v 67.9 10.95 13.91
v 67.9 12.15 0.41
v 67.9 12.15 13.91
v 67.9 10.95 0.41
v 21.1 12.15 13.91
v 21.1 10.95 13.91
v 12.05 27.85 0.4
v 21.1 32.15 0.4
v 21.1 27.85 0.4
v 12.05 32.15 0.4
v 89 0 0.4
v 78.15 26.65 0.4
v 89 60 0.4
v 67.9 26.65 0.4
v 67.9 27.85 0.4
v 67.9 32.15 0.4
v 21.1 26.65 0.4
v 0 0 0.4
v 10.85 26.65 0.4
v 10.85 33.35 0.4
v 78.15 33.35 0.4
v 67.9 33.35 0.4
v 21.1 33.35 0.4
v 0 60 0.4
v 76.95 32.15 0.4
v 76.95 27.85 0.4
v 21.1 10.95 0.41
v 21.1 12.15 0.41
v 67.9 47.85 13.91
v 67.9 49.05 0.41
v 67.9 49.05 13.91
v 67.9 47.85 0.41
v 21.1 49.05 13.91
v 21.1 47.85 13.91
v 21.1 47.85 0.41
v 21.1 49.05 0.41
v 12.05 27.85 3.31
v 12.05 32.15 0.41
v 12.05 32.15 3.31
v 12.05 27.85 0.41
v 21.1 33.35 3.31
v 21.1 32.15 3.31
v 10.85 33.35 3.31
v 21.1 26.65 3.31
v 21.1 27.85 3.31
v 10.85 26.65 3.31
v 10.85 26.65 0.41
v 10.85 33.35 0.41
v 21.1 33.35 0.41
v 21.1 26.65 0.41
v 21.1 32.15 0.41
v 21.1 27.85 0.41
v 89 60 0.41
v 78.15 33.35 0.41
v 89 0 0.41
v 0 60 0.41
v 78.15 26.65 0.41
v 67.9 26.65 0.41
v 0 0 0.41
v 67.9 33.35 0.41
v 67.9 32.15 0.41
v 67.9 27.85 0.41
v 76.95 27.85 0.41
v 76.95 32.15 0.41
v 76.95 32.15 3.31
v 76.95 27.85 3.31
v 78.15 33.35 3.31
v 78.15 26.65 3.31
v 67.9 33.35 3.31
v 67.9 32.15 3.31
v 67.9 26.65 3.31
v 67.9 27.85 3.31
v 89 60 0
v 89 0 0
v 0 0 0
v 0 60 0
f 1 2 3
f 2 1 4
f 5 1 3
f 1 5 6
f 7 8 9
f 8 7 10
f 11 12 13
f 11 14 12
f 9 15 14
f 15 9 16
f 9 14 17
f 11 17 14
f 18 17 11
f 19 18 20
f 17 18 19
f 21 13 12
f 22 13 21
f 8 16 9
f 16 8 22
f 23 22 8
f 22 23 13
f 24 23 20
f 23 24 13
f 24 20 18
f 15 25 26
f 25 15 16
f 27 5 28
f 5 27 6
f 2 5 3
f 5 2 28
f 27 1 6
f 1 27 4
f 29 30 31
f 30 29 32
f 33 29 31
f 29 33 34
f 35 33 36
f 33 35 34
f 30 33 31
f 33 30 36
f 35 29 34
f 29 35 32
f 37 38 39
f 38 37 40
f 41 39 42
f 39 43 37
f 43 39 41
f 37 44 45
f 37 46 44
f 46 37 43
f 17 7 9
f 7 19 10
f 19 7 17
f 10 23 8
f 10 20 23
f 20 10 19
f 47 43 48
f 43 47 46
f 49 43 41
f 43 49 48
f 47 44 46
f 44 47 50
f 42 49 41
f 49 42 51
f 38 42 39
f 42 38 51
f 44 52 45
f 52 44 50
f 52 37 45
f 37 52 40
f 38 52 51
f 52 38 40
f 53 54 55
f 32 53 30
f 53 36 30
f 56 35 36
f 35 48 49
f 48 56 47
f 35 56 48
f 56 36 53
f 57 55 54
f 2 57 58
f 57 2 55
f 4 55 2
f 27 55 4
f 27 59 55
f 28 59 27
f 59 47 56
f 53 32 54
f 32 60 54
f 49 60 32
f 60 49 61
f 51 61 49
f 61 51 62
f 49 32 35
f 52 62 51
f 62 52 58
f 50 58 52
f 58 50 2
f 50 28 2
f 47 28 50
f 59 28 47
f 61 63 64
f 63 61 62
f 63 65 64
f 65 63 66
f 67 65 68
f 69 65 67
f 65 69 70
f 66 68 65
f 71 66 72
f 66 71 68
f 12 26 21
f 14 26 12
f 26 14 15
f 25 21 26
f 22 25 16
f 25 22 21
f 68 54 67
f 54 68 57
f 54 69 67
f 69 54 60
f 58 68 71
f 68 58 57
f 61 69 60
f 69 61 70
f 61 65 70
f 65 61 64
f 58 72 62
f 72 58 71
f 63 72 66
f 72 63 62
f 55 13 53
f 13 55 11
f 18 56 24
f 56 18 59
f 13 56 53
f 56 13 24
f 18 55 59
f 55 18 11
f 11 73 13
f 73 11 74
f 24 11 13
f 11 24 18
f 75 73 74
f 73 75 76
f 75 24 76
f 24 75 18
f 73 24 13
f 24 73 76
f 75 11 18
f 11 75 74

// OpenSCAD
// file: ../../Base/Rotation.scad
// Fischertechnik Box Foundation
// Geometry Helpers Rotation

include <PlacementOptions.scad>

// getRotatedSpace(space, rotation=NoRotation)
// Rotates the space dependent on the specified rotation

function getRotatedSpace(space, rotation=NoRotation) = [
    (rotation == Rotate90 || rotation == Rotate270) ? space.y : space.x,
    (rotation == Rotate90 || rotation == Rotate270) ? space.x : space.y
];

// Rotates the given space around the fixed left lower corner
// space = the space the children needs as width/depth list [width,depth]
// rotation = 0 Rotate0 degrees, 1 Rotate90 degrees, 2 Rotate180 degrees, 3 Rotate270 degrees (equivalent to -90)

module RotateFix(space, rotation=NoRotation) {
    dy = (rotation == Rotate0 || rotation == Rotate270) ? 0 :
        (rotation == Rotate90) ? space.x :
        space.y;
    dx = (rotation < Rotate180) ? 0 :
        (rotation == Rotate180) ? space.x :
        space.y;
    
    translate([dx, dy, 0])
        rotate([0, 0, rotations[rotation]])
            children();
}
// file: ../../Base/Alignment.scad
// Fischertechnik Box Foundation
// Geometry Helpers Alignment

include <PlacementOptions.scad>

// getAlignedX(elementWidth, spaceWidth, align=AlignRight, offset=0)
// Gets the aligned X offset of an element with the given
// width in the given space.
// elementWidth = The width of the element to positon
// spaceWidth = The space where the element should be aligned
// align = 0 AlignLeft, 1 AlignCenter, 2 AlignRight
// offset = an optional offset from the aligned position. When
// aligned left or centered, then positive values are in X direction.
// When aligned right then positive values are in negative X direction.

function getAlignedX(elementWidth, spaceWidth, align=AlignRight, offset=0) =
    (align == AlignLeft) ?
        offset :
        ((align == AlignCenter) ?
        (spaceWidth - elementWidth)/2 + offset :
        spaceWidth - offset - elementWidth);

// getAlignedY(elementDepth, spaceDepth, align=AlignTop, offset=0)
// Gets the aligned Y offset of an element with the given
// depth in the given space.
// elementDepth = The depth of the element to positon
// spaceDepth = The space where the element should be aligned
// align = 0 AlignBottom, 1 AlignCenter, 2 AlignTop
// offset = an optional offset from the aligned position. When
// aligned bottom or centered, then positive values are in Y direction.
// When aligned top then positive values are in negative Y direction.

function getAlignedY(elementDepth, spaceDepth, align=AlignTop, offset=0) =
    (align == AlignBottom) ?
        offset :
        ((align == AlignCenter) ?
        (spaceDepth - elementDepth)/2 + offset :
        spaceDepth - offset - elementDepth);
// file: ../../Base/PlacementOptions.scad
// Fischertechnik Box Foundation
// Placement Options

// Alignment
NoAlign = 0;
AlignLeft = 1;
AlignBottom = 2;
AlignCenter = 3;
AlignRight = 4;
AlignTop = 5;

// Element rotation degree steps
rotations = [0, -90, -180, -270];

// Rotation
NoRotation = 0;
Rotate0 = 0;
Rotate90 = 1;
Rotate180 = 2;
Rotate270 = 3;

// Docking (seen from above)
NoDock = -1;
DockLeft = 0;
DockTop = 1;
DockRight = 2;
DockCorner = 2;
DockBottom = 3;

// Web corners
LowerLeft = 0;
UpperLeft = 1;
UpperRight = 2;
LowerRight = 3;

// Web position relative to corner
LeftOfCorner = 0;
RightOfCorner = 1;
// file: ../../Base/Boxes.scad
// Fischertechnik Box Foundation
// Pre-designed Boxes

use <Constants.scad>

include <PlacementOptions.scad>

box190Width = 190;
box190Depth = 130;
box130Width = 130;
box130Depth = 95;

// Values are from an original ec3 box
topBottomDifference = 1.5;
outerHeight = 40;
innerHeight = 38.2;
baseThickness = outerHeight - innerHeight;
stackExcess = 5.7;
radius = 3.5;
wallThickness = 1.5;
tolerance = 0.2;
stackOffset = innerHeight - stackExcess;

boxUsageHeight = stackOffset;
boxWallThickness = wallThickness;
boxBaseThickness = baseThickness;
boxWebWidth = 3.0;

// getBoxWallThickness()
// Gets the wall thickness of a Fischertechnik Box
function getBoxWallThickness() = boxWallThickness;

// getBoxUsageHeight()
// Gets the usable height of a Fischertechnik box
function getBoxUsageHeight() = boxUsageHeight;

// getBoxInnerHeight()
// Gets the inner height of a Fischertechnik box, including the stack excess
function getBoxInnerHeight() = innerHeight;

// getBoxBaseThickness()
// Gets the thickness of the Fischertechnik box base.
function getBoxBaseThickness() = boxBaseThickness;

// getBoxWebWidth()
// Gets the width of a box web
function getBoxWebWidth() = boxWebWidth;

// getBox190Space()
// Gets the usable inner space of a Box 190 as an x/y-list
function getBox190Space() = [
    box190Width - 2*getBoxWallThickness() - topBottomDifference, 
    box190Depth - 2*getBoxWallThickness() - topBottomDifference ];

// BoxBase(width, depth)
// Creates an empty stackable Fischertechnik compatible box
// width = Outer width of the box (190, 130, ...)
// depth = Outer depth of the box (130, 95, ...)

module BoxBase(width, depth, height=outerHeight) {    
    thinPlate = 0.01;

    innerHeight = height - baseThickness;    
    
    module BodyPlate(width, depth) {
        translate([radius, radius])
        hull() {
            w = width-2*radius;
            d = depth-2*radius;
            cube([w, d, thinPlate]);
            cylinder(thinPlate, r=radius, $fn=getFragments());
            translate([w, 0])
                cylinder(thinPlate, r=radius, $fn=getFragments());
            translate([w, d])
                cylinder(thinPlate, r=radius, $fn=getFragments());
            translate([0, d])
                cylinder(thinPlate, r=radius, $fn=getFragments());
        }
    }
    
    module Body(tolerance=tolerance) {
        hull() {
            // Bottom with tolerance to fit into the original boxes when stacked
            translate([-wallThickness+tolerance, -wallThickness+tolerance, -baseThickness])
                BodyPlate(width-topBottomDifference-2*tolerance, depth-topBottomDifference-2*tolerance);
            
            // Top
            translate([-wallThickness-topBottomDifference/2, -wallThickness-topBottomDifference/2, innerHeight-thinPlate])
                BodyPlate(width, depth);
         }
    }

    module Cutoff() {
        hull() {
            coWidth = width - 2*wallThickness;
            coDepth = depth - 2*wallThickness;
            
            // Bottom
            BodyPlate(coWidth-topBottomDifference, coDepth-topBottomDifference);

            // Top
            translate([-topBottomDifference/2, -topBottomDifference/2, innerHeight+thinPlate]) 
                BodyPlate(coWidth, coDepth);
        }
    }
    
    difference() {        
        Body();
        Cutoff();
        stackOffset = innerHeight - stackExcess;
        translate([0, 0, stackOffset + baseThickness])
            Body(tolerance=0);
    }
}

// Creates the Fischertechnik empty box 130x190 mm and places it at position 0,0
// 190x130 are the outer sizes, the inner space is slightly smaller. Use getBox190Space() to get the inner sizes.
// The box is positioned that the usable inner space is at the 0,0,0 position. The

module Box190() {
    BoxBase(box190Width, box190Depth);
}

// Gets the usable inner space of a Box 130 as an x/y-list
function getBox130Space() = [
    box130Width - 2*getBoxWallThickness() - topBottomDifference, 
    box130Depth - 2*getBoxWallThickness() - topBottomDifference ];

// Creates the Fischertechnik empty box 95x130 mm and places it at position 0,0
// 190x130 are the outer sizes, the inner space is slightly smaller. Use getBox190Space() to get the inner sizes.
// The box is positioned that the usable inner space is at the 0,0,0 position. The

module Box130() {
    BoxBase(box130Width, box130Depth);
}

// Creates a web at the specified box walls
// corner 0 = LowerLeft, 1 = UpperLeft, 2 = UpperRight, 3 = LowerRight
// side 0 = LeftOfCorner, 1 = RightOfCorner
// distance = Distance in mm from the corner
// boxSpace = inner width and depth of the box (default: Box 190)
// webWidth = length of the web (default is 3 mms)
// webThickness = thickness of the web (default is 1 mm)

module BoxWeb(corner, side, distance, boxSpace=getBox190Space(), webWidth=getBoxWebWidth(), webThickness=1.0) {
    sink = getBoxWallThickness()/2;

    width = (corner % 2 == 0) ? 
            (side == LeftOfCorner ? webWidth : webThickness) :
            (side == LeftOfCorner ? webThickness : webWidth);

    depth = (corner % 2 == 0) ? 
            (side == RightOfCorner ? webWidth : webThickness) :
            (side == RightOfCorner ? webThickness : webWidth);
    
    xDiff = corner == LowerLeft ? 
                (side == LeftOfCorner ? -sink : distance) :
            (corner == UpperLeft ?                
                (side == LeftOfCorner ? distance : -sink) :
            (corner == UpperRight ?
                (side == LeftOfCorner ? boxSpace.x-webWidth+sink : boxSpace.x-distance-webThickness) :
                (side == LeftOfCorner ? boxSpace.x-distance-webThickness: boxSpace.x-webWidth+sink)));

    yDiff = corner == LowerLeft ? 
                (side == RightOfCorner ? -sink : distance) :
            (corner == UpperLeft ?
                (side == RightOfCorner ? boxSpace.y-distance : boxSpace.y-webWidth+sink) :
            (corner == UpperRight ?
                (side == RightOfCorner ? boxSpace.y-webWidth+sink : boxSpace.y-distance) :
                (side == RightOfCorner ? distance : -sink)));
    
    translate([xDiff, yDiff, -getExcess()])
        cube([width, depth, boxUsageHeight + 2*getExcess()]);
}
// file: ../../Base/Placement.scad
// Fischertechnik Box Foundation
// Geometry Helpers Placement

use <Constants.scad>
use <Alignment.scad>
use <Rotation.scad>
use <Boxes.scad>

include <PlacementOptions.scad>

// Place(x=0, y=0, elementSpace=[0,0], alignX=AlignLeft, alignY=AlignBottom, rotation=Rotate0, boxSpace=getBox190Space())
// Places the child at the specified position
// y = Y-Position. This is a relative position when an X aligment is specified.
// x = X-Position. This is a relative position when an Y aligment is specified.
// elementSpace = space of the element to be placed [x,y]
// alignX = -1=NoAlign, 0 AlignLeft, 1 AlignCenter, 3 AlignRight (elementSpace and boxSpace required!)
// alignY = -1=NoAlign, 2 AlignBottom, 1 AlignCenter, 4 AlignTop (elementSpace and boxSpace required!)
// rotation = 0 Rotate0 0 degrees, 1 Rotate90 90 degrees, 
// 2 Rotate180 180 degrees, 3 Rotate270 270 degrees (equivalent to -90)
// boxSpace = Inner space of the box where the placement occurs [x,y] - default is Box 190x130 inner space

module Place(x=0, y=0, elementSpace=[0,0], 
  alignX=AlignLeft, alignY=AlignBottom, 
  rotation=NoRotation, boxSpace=getBox190Space()) {

    module Position(x, y, space, rotation=Rotate0) {
        translate([x, y, 0])
            RotateFix(space, rotation)
                children();
    }

    space = getRotatedSpace(elementSpace, rotation);
    alignedX = getAlignedX(space.x, boxSpace.x, alignX, x);
    alignedY = getAlignedY(space.y, boxSpace.y, alignY, y);
    Position(alignedX, alignedY, elementSpace, rotation)
        children();
}

// Center(space=getBox130Space(), elementSpace=[0,0])
// space = Space where the children is centered. For cylinder use centered=true and no elementSpace.
// elementSpace = space of the element to be centered [x,y]

module Center(space=getBox190Space(), elementSpace=[0,0]) {
    Place(elementSpace=elementSpace, boxSpace=space, alignX=AlignCenter, alignY=AlignCenter)
        children();
}

// CenterHorizontal(width=0, y=0, offset=0, space=getBox130Space())
// width = Width of the element to be placed.
// y = Y position of the element
// offset = Offset from the center position (negative will be left of the center)
// space = Space where the element is placed

module CenterHorizontal(width=0, y=0, offset=0, space=getBox190Space()) {
    Place(x=offset, y=y, elementSpace=[width, 0], boxSpace=space, alignX=AlignCenter)
        children(0);
}

// CenterVertical(depth=0, x=0, offset=0, space=getBox130Space())
// depth = Depth of the element to be placed.
// x = X position of the element
// offset = Offset from the center position (negative will be down of the center)
// space = Space where the element is placed

module CenterVertical(depth=0, x=0, offset=0, space=getBox190Space()) {
    Place(x=x, y=offset, elementSpace=[0, depth], boxSpace=space, alignY=AlignCenter)
        children(0);
}

// getIsVertical(align)
// True if the specified alignment needs a vertical orientation for a divider (AlignRight, AlignLeft)

function getIsVertical(align) = (align == AlignRight || align == AlignLeft);

// getIsHorizontal(align)
// True if the specified alignment needs a horizontal orientation for a divider (AlignTop, AlignBottom)

function getIsHorizontal(align) = (align == AlignTop || align == AlignBottom);
// file: ../../Elements/AxisClip10.scad
// Fischertechnik Box Library
// Axis for clip 10
// 31023

use <../ModelBase/Simple.scad>
use <../Base/Constants.scad>

width = 12;
depth = 12;
height = 23;
upperDiameter = 3.6;
clipHeight = 10;

// getAxisClip10Space()
// Gets the space of a frame for a clip 10 with spring ring (mot2)

function getAxisClip10Space() = [width, depth, height];

// AxisClip10(height, clipHeight)
// Axis for clip 10 with spring ring (mot2)
// height = Height of the complete axis
// clipHeight = Height of the rt for the clip (standard is 10, in mot3 its only 7)

module AxisClip10(height=height, clipHeight=clipHeight) {
    LeveledAxisWithSpace(height, height-clipHeight, getAxisClip10Space(), diameter=upperDiameter);
}

// Tests
color("lightgray")
AxisClip10();
// file: ../../Base/Constants.scad
// Fischertechnik Box Foundation
// Constants

// Constant values necessary for multiple elements

// Base constants
dividerThickness = 1.2;
excess = 0.01;
fragments = 90;
tolerance = 0.8;

// Gets the thickness of a divider 
function getDividerThickness() = dividerThickness;

// Gets the excess that is used to merge walls into each other
function getExcess() = excess;

// Gets amount of fragments of a cylinder
function getFragments() = fragments;

// Gets the inner tolerance of a frame to each side
function getTolerance() = tolerance;


// Fischertechnik specific constants
axisDiameter = 4;
axisBottomDiameter = axisDiameter + 1;
standardEdgeDistance = 2.5;
standardWebDistance = 11.5;
standardCornerLength = 15;
tubeWallFactor = 0.8;
smallPartsFrameHeight = 20;

// Gets axis diameter
function getAxisDiameter() = axisDiameter;

// Gets axis bottom diameter for thicker part at the bottom
function getAxisBottomDiameter() = axisBottomDiameter;

// gets the standard distance to the wall of the box for dockable frames with webs
function getStandardEdgeDistance() = standardEdgeDistance;

// gets the standard distance of each web to the corner of the dockable frame
function getStandardWebDistance() = standardWebDistance;

// gets the standard length of the corner walls of a dockable frame
function getStandardCornerLength() = standardCornerLength;

// gets the wall thickness of a tube.
function getTubeWallThickness() = tubeWallFactor * getDividerThickness();

// gets the frame height for docked small parts boxes.
function getSmallPartsFrameHeight() = smallPartsFrameHeight;
// file: ../../Elements/HolderCompleteBucket.scad
// Fischertechnik Box Library
// Complete Bucket Holder
// 37354, 37353, 37355, 38257

use <../Base/Constants.scad>
use <../ModelBase/Simple.scad>
use <../ModelBase/Complex.scad>

width = 89;
depth = 60;

// getHolderCompleteBucketSpace()
// Gets the space the holder complete bucket needs as width and depth (.x and .y as a list)

function getHolderCompleteBucketSpace() = [width, depth];

// HolderCompleteBucket()
// Holder for complete bucket with three middle and two side parts, 
// and a middle axis.
// 37354, 37353, 37355, 38257

module HolderCompleteBucket() {
    railWidth = 46.8;
    railHeight = 13.5;
    railDistance = 35.7;
    outerPinFrameLength = 10.25;
    innerPinFrameLength = outerPinFrameLength - 3*getDividerThickness();
    innerPinFrameDepth = 4.3;
    outerPinFrameDepth = innerPinFrameDepth + 2*getDividerThickness();
    pinFrameHeight = 2.9;
    
    Space(getHolderCompleteBucketSpace());

    railXOffset = (getHolderCompleteBucketSpace().x - railWidth) / 2;
    railYOffset1 = (getHolderCompleteBucketSpace().y - railDistance) / 2 - getDividerThickness();
    railYOffset2 = railYOffset1 + railDistance + getDividerThickness();    
    
    translate([railXOffset, 0, 0]) {
        translate([0, railYOffset1, 0])
            Wall([railWidth, getDividerThickness(), railHeight]);
        translate([0, railYOffset2, 0])
            Wall([railWidth, getDividerThickness(), railHeight]);
    }
    
    midYOffset = (getHolderCompleteBucketSpace().y - outerPinFrameDepth) / 2;
    
    railXOffset1 = railXOffset - outerPinFrameLength;
    translate([railXOffset1, midYOffset, 0])
        DockableFrame([innerPinFrameLength, innerPinFrameDepth, pinFrameHeight], wallRight=false, tolerance=0);
    
    railXOffset2 = outerPinFrameLength + railXOffset + railWidth;
    translate([railXOffset2, midYOffset, 0])
        mirror([1,0,0])
            DockableFrame([innerPinFrameLength, innerPinFrameDepth, pinFrameHeight], wallRight=false, tolerance=0);
}

// Test
color("lightgray")
HolderCompleteBucket();
// file: ../TestPrint.scad
// 3D Print Test Base

use <../Base/Constants.scad>

use <../Elements/AxisClip10.scad>

module TestPrint(elementSpace) {
    cube([elementSpace.x, elementSpace.y, 0.4]);
    translate([0,0,0.4+getExcess()]) {
        children();
    }
}

TestPrint(getAxisClip10Space())
    AxisClip10();
// main file
// 3D Print Test
// HolderCompleteBucket

use <../TestPrint.scad>
use <../../Elements/HolderCompleteBucket.scad>

TestPrint(getHolderCompleteBucketSpace())
    HolderCompleteBucket();
